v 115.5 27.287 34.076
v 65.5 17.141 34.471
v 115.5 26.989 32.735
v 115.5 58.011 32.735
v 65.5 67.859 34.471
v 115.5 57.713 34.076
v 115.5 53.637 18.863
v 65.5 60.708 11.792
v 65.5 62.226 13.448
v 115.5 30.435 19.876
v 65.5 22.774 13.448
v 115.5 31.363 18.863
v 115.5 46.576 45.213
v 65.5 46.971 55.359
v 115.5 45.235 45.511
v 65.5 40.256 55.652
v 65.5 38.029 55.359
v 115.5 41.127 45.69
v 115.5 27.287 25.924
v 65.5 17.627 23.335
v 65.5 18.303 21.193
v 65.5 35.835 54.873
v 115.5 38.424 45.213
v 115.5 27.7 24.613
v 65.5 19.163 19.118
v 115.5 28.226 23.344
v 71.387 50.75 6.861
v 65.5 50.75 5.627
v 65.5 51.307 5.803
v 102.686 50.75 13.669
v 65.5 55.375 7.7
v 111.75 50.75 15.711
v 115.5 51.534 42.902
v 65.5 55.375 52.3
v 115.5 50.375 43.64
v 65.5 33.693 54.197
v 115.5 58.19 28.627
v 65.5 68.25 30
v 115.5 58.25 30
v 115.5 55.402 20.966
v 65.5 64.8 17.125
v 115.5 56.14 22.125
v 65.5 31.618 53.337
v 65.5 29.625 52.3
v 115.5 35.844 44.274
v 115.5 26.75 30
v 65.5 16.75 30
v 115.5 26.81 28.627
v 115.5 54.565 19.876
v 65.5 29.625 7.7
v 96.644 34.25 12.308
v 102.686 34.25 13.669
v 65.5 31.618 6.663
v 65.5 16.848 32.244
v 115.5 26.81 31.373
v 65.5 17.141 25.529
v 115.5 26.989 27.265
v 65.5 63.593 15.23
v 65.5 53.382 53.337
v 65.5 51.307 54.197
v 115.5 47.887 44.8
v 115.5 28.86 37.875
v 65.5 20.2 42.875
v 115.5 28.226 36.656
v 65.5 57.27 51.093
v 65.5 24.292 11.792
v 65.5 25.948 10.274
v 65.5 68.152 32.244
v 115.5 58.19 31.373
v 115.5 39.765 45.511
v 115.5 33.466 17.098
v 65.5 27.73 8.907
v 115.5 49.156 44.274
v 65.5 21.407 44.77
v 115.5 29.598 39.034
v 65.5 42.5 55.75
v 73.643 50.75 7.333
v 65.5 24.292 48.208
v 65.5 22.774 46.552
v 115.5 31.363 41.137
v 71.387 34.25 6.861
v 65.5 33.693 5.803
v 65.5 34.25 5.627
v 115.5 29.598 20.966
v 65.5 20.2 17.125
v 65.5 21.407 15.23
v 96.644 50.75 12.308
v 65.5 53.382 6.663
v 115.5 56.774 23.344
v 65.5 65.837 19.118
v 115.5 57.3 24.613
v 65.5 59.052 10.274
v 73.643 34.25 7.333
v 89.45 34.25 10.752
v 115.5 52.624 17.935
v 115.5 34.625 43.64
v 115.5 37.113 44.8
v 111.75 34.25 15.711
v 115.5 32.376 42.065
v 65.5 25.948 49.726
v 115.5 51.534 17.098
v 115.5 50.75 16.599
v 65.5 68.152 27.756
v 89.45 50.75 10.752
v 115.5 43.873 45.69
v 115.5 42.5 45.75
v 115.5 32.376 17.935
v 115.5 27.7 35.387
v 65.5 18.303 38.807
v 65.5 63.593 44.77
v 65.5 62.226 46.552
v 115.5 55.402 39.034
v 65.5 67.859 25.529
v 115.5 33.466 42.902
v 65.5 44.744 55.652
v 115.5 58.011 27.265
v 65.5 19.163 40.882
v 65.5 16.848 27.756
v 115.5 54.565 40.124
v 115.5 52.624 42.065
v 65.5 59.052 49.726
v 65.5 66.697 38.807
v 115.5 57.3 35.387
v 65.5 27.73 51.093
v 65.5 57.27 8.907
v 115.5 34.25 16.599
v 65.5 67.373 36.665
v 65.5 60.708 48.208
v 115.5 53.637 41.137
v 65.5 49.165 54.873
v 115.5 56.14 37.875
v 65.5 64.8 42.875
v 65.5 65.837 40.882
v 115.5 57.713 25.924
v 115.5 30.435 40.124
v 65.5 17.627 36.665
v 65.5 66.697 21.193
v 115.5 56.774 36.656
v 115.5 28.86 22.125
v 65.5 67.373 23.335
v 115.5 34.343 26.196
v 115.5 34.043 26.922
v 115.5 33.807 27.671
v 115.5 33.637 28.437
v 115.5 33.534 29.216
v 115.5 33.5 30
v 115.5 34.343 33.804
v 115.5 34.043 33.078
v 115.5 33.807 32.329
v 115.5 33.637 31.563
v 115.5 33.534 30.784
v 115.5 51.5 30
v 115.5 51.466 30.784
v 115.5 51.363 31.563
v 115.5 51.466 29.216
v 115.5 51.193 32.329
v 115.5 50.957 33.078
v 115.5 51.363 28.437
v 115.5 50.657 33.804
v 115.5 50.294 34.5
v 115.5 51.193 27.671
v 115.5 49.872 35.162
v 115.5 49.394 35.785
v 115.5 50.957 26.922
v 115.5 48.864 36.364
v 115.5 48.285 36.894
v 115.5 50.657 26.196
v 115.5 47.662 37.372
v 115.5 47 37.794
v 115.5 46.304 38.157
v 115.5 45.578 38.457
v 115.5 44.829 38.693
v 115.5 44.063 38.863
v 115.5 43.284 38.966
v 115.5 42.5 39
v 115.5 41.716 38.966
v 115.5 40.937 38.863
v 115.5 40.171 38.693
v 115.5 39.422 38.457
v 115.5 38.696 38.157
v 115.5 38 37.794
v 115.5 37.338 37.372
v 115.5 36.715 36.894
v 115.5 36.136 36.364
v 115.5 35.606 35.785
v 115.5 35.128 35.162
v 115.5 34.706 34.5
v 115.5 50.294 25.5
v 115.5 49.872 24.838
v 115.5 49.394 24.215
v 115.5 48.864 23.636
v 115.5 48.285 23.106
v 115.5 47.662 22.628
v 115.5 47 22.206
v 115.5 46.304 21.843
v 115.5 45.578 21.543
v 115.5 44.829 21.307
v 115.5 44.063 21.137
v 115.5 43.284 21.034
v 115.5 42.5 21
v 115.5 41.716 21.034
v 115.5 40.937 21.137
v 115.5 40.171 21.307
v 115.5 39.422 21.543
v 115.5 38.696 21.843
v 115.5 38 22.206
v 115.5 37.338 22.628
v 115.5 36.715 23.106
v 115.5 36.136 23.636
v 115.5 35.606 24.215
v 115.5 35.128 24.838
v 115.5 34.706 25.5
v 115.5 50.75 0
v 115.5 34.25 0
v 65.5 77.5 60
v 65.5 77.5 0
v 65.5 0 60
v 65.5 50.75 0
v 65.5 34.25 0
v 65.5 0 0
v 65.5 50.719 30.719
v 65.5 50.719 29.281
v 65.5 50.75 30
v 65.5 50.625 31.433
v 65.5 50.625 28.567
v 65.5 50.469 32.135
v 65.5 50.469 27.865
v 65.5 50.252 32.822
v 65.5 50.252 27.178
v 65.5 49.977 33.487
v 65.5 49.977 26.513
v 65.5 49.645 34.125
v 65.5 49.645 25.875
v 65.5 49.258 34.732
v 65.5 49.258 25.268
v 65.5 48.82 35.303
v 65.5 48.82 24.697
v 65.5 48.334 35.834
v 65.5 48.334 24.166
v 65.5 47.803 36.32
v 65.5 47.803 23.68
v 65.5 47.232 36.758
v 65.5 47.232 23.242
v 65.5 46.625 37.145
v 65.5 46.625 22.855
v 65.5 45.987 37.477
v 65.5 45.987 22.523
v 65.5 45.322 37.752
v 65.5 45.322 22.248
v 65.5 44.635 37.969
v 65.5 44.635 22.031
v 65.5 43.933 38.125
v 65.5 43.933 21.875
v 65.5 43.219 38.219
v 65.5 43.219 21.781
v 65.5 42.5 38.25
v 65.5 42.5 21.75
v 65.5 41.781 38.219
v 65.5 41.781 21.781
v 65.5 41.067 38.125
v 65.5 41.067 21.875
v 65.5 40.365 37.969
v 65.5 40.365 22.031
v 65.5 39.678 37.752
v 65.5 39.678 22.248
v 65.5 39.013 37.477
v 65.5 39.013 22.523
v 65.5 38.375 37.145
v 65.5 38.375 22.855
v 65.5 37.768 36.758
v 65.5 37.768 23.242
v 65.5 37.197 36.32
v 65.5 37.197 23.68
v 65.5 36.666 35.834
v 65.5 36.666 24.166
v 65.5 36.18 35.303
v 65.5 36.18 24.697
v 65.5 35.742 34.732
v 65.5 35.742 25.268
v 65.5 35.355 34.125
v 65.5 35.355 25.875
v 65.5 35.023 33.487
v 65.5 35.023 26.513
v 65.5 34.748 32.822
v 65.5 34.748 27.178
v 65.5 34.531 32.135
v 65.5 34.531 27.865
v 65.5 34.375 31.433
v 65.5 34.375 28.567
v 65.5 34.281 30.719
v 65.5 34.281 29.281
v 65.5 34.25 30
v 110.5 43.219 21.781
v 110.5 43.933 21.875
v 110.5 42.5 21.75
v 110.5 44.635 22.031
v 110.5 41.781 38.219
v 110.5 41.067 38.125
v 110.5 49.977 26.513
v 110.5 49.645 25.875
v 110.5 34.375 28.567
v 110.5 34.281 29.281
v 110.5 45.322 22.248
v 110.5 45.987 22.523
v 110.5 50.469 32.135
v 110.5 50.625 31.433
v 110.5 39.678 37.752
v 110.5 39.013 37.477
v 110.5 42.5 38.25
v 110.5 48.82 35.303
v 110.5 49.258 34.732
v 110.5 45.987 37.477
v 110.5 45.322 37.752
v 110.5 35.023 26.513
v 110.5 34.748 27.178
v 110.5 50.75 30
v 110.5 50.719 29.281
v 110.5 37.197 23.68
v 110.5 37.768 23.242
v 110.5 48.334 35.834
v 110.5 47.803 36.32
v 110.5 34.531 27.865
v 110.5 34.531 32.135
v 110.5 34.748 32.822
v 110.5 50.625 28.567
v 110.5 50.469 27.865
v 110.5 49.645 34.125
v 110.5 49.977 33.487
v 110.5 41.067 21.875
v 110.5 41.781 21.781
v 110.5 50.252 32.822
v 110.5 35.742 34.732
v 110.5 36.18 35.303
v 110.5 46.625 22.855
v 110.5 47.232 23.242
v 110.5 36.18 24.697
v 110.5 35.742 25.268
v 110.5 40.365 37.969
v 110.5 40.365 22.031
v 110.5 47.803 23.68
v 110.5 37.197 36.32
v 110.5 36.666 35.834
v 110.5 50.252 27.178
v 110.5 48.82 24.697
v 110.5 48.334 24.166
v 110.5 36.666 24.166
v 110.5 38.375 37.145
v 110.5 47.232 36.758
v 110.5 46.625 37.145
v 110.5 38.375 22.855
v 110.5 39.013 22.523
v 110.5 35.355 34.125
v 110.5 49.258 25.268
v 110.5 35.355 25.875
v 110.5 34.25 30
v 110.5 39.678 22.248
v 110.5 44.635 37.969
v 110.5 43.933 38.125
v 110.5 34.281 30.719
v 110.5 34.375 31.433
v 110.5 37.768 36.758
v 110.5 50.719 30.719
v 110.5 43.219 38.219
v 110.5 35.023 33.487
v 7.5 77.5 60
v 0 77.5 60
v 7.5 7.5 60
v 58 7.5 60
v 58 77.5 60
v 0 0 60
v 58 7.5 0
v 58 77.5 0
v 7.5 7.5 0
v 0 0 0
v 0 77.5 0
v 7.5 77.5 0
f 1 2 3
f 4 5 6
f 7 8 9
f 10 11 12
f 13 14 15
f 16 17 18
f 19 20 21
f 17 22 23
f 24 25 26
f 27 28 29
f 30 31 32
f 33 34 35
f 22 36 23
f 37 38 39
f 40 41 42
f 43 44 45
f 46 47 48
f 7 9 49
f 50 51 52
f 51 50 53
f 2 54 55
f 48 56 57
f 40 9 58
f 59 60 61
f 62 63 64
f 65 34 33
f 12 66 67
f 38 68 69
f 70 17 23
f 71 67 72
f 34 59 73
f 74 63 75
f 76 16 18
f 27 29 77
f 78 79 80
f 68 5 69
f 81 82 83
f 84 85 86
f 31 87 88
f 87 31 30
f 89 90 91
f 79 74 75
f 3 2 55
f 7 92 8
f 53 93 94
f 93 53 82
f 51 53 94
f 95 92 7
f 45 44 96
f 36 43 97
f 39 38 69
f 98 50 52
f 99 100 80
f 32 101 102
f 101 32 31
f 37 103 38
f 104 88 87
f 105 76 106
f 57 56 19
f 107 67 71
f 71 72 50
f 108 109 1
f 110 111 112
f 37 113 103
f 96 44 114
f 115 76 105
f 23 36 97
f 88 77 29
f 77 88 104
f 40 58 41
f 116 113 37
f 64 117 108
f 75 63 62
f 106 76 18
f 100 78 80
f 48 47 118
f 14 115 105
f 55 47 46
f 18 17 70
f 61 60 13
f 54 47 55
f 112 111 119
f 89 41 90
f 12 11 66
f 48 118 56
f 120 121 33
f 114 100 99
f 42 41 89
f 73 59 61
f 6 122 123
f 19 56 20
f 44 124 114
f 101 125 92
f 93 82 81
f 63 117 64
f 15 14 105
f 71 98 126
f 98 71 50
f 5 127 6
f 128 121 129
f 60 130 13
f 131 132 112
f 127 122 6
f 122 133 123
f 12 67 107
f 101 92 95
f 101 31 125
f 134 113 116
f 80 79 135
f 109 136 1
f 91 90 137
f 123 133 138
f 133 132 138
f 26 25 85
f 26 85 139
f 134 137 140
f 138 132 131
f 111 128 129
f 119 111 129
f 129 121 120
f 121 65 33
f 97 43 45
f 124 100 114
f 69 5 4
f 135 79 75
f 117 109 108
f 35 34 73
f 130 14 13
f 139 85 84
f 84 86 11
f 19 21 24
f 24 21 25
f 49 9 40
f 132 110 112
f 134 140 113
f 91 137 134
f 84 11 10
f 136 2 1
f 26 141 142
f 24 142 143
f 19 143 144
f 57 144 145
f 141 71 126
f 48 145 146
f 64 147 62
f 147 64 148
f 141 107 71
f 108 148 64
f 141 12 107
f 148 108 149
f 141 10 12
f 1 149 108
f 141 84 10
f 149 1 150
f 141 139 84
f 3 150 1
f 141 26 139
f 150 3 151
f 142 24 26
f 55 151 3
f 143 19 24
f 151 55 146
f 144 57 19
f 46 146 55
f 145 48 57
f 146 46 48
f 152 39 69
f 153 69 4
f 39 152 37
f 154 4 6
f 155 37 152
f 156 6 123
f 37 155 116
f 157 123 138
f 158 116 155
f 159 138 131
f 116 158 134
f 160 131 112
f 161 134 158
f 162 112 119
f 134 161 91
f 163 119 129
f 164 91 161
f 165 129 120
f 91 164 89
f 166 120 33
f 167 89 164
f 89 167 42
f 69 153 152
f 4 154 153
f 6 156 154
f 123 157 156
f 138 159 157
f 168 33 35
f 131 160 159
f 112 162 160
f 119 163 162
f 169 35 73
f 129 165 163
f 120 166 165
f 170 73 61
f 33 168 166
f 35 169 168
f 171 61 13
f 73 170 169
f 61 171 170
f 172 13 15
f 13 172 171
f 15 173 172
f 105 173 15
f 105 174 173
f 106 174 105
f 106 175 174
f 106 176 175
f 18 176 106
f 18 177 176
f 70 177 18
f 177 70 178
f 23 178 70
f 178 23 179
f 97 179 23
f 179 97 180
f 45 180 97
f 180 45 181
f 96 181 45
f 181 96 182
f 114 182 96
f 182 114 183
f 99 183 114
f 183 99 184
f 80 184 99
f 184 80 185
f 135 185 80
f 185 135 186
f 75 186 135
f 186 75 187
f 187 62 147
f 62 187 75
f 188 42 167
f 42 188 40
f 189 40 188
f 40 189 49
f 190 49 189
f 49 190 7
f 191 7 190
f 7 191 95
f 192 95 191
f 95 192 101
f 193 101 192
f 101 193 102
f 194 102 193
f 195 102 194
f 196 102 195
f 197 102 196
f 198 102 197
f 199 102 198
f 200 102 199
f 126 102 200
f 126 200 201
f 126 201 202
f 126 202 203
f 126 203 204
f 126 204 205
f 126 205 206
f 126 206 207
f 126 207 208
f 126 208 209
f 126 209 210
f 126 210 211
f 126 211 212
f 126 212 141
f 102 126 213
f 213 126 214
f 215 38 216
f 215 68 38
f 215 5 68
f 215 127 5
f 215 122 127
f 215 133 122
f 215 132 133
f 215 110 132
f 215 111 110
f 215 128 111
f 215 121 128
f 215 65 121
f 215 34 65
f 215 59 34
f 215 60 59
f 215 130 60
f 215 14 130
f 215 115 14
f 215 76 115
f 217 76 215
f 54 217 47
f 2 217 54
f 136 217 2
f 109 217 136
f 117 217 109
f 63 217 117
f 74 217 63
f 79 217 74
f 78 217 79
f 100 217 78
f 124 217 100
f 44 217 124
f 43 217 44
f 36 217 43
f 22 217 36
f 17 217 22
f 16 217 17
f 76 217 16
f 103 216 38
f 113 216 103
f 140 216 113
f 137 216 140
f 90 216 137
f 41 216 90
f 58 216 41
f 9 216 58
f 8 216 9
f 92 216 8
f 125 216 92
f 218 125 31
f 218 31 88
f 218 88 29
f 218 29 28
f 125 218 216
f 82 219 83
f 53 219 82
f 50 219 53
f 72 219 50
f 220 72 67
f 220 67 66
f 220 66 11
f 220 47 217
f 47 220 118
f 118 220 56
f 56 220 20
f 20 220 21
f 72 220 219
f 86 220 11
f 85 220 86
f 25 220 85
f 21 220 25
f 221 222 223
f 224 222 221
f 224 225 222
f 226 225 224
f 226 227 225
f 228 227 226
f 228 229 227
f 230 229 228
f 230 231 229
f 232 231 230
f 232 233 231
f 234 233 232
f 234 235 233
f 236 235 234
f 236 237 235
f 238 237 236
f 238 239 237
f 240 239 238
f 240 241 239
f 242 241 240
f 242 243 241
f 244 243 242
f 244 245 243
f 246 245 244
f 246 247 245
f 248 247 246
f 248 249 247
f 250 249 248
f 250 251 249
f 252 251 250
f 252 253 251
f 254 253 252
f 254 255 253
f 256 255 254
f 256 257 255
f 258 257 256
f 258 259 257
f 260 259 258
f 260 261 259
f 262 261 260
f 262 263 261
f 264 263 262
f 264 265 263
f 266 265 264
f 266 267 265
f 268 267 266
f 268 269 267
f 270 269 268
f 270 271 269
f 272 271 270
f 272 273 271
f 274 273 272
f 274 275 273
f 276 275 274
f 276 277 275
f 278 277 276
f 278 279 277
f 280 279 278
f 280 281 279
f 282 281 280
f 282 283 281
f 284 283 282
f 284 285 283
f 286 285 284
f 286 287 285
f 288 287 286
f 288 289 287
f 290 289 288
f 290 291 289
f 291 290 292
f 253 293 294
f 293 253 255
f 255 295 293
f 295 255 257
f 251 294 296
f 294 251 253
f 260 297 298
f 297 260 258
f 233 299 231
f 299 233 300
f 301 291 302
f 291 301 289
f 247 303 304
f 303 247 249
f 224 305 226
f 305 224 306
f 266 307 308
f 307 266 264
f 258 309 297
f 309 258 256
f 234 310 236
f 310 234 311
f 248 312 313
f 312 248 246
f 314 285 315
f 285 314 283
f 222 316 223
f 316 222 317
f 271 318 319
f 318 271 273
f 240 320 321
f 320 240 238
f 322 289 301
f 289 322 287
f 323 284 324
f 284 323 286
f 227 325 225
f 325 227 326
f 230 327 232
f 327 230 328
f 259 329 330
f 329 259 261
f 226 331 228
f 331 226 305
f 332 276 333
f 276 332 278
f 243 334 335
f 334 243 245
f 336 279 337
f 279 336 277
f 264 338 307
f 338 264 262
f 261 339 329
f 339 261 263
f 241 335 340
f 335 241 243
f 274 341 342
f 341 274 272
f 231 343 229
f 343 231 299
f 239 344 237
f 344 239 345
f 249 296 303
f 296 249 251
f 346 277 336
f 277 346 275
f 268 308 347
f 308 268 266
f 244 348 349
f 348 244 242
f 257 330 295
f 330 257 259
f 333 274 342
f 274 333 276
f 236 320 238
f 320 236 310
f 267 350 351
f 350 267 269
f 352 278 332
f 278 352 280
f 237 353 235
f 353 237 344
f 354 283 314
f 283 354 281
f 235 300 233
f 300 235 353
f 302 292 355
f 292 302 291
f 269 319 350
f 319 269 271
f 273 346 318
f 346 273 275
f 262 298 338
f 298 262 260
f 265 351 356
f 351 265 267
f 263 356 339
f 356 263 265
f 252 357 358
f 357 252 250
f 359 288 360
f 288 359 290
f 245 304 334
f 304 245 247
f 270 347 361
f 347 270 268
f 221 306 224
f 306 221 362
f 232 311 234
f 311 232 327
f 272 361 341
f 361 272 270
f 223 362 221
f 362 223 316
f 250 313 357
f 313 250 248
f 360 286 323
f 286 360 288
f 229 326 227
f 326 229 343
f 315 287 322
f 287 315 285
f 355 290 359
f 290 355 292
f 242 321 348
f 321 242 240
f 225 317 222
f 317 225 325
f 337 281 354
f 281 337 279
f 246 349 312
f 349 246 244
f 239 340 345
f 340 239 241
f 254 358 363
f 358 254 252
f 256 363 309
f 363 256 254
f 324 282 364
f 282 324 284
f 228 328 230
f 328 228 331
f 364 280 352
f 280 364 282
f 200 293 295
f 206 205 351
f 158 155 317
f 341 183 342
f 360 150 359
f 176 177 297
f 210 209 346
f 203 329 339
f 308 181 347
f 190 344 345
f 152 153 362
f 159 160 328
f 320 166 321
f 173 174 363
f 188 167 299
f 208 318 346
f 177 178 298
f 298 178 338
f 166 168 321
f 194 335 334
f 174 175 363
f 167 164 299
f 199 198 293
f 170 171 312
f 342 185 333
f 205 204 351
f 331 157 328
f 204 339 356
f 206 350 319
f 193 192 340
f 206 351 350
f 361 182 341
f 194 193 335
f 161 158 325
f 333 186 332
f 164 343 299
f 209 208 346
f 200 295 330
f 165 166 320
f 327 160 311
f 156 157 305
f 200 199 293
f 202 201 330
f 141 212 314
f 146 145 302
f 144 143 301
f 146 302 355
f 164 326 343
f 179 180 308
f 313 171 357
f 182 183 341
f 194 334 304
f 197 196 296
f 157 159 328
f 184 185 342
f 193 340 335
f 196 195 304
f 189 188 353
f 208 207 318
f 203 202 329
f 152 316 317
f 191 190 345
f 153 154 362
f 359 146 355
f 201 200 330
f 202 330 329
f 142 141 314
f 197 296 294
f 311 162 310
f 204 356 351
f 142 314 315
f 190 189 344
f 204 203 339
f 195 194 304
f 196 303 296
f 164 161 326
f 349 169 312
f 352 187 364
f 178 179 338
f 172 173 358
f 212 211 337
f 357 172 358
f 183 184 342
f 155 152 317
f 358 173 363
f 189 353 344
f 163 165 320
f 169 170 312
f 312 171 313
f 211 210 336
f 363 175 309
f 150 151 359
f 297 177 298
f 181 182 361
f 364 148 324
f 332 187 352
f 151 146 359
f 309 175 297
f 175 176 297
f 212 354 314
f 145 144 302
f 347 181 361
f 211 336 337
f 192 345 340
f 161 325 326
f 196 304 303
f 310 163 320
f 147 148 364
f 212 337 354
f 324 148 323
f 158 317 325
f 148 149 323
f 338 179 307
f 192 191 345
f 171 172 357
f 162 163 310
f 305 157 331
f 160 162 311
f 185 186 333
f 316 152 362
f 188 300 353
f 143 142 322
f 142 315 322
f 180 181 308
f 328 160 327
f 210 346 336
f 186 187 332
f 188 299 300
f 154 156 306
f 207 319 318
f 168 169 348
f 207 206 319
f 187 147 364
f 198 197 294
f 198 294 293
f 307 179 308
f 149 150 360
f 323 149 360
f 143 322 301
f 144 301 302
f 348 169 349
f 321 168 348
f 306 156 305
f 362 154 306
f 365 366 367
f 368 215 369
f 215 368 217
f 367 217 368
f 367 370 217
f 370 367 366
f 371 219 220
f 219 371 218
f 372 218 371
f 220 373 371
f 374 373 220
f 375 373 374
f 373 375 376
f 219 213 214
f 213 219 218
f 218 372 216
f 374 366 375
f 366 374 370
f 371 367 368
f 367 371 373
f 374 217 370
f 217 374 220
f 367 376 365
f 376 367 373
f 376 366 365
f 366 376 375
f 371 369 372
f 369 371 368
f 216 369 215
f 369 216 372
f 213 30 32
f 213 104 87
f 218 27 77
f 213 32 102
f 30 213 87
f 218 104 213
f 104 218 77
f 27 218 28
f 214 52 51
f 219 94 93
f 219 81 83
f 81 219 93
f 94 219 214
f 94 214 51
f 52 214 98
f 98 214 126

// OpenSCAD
// file: measurements.scad
// The thickness of any walls (e.g. the difference between the inner and outer radiuses of a tube retainer).
thickness_mm = 7.5;

// The tube which spaces apart the VESA mount and the Kinect mount.
////////////////////////////////////////////////////////////////////////////////

// The diameter of the narrowest part of the tube's retainer.
tube_retainer_diameter_mm = 16.5;

// The total length of the tube's retainer.
tube_retainer_length_mm = 50;

// The diameter of the widest part of the tube's retainer.
tube_feed_diameter_mm = 18;

// The length of the transition between the widest and narrowest parts of the
// tube's retainer.
tube_feed_length_mm = 5;

// The number of sides on the tube's retainer.
tube_sides = 72;

// Additional radius added where a tube mounting meets a surface.
tube_widening_mm = 10;

// Kinect for Xbox 360.
////////////////////////////////////////////////////////////////////////////////

// The length of the Kinect's base.
kinect_length_mm = 75;

// The width of the bottom of the Kinect's base.
kinect_lower_width_mm = 81;

// The thickness of the base below the Kinect.
kinect_base_height_mm = 2;

// The width of the middle of the Kinect's base (its widest point).
kinect_middle_width_mm = 88.5;

// The distance between the bottom of the Kinect's base and its widest point.
kinect_lower_height_mm = 13;

// The width of the top of the Kinect's base.
kinect_top_width_mm = 80;

// The distance between the widest point of the Kinect's base and the top of the
// retainer.
kinect_upper_height_mm = 5;

// The thickness of the Kinect's retainer.
kinect_clip_thickness_mm = 2;

// The diameter of the head of the M3 screw used to secure the Kinect.
kinect_screw_head_diameter_mm = 7;

// The diameter of the hole required by the M3 screw used to secure the Kinect.
kinect_screw_hole_diameter_mm = 2.95;

// The number of sides of the head of or the hole required by the M3 screw used
// to secure the Kinect.
kinect_screw_sides = 24;

// The distance between the Kinect's front and back screw holes.
kinect_screw_y_spacing_mm = 19.25;

// The distance between the Kinect's left and right screw holes.
kinect_screw_x_spacing_mm = 68.5;

// The space which must be clear behind a Kinect for cable routing.
kinect_cable_spacing_mm = 15;

// The MALM push-fit bracket.
////////////////////////////////////////////////////////////////////////////////

// The thickness of the desk.
malm_height_mm = 50.5;

// The length of the fingers which push onto the desk.  Increase to improve
// pitch stability.
malm_length_mm = 70;

// The width of the fingers which push onto the desk.  Increase to improve roll
// stability.
malm_width_mm = 60;
// main file
include <measurements.scad>

cube([
    malm_height_mm + thickness_mm * 2,
    thickness_mm,
    malm_width_mm,
]);

translate([0, thickness_mm, 0]) {
    cube([
        thickness_mm,
        malm_length_mm,
        malm_width_mm,
    ]);
};

translate([malm_height_mm + thickness_mm, thickness_mm, 0]) {
    cube([
        thickness_mm,
        malm_length_mm,
        malm_width_mm,
    ]);
};

translate([malm_height_mm + thickness_mm * 2, thickness_mm + malm_length_mm / 2 - tube_retainer_diameter_mm / 2, 0]) {
    cube([
        tube_retainer_length_mm,
        tube_retainer_diameter_mm,
        (malm_width_mm - tube_feed_diameter_mm) / 2,
    ]);
};

translate([malm_height_mm + thickness_mm * 2, thickness_mm + malm_length_mm / 2, malm_width_mm / 2]) {
    rotate([0, 90, 0]) {
        difference() {
            cylinder(
                d1 = tube_retainer_diameter_mm + thickness_mm * 2 + tube_widening_mm * 2,
                d2 = tube_retainer_diameter_mm + thickness_mm * 2,
                h = tube_retainer_length_mm,
                $fn = tube_sides
            );

            cylinder(
                d = tube_retainer_diameter_mm,
                h = tube_retainer_length_mm,
                $fn = tube_sides
            );

            translate([0, 0, tube_retainer_length_mm - tube_feed_length_mm]) {
                cylinder(
                    d1 = tube_retainer_diameter_mm,
                    d2 = tube_feed_diameter_mm,
                    h = tube_feed_length_mm,
                    $fn = tube_sides
                );
            };
        };
    };
};
